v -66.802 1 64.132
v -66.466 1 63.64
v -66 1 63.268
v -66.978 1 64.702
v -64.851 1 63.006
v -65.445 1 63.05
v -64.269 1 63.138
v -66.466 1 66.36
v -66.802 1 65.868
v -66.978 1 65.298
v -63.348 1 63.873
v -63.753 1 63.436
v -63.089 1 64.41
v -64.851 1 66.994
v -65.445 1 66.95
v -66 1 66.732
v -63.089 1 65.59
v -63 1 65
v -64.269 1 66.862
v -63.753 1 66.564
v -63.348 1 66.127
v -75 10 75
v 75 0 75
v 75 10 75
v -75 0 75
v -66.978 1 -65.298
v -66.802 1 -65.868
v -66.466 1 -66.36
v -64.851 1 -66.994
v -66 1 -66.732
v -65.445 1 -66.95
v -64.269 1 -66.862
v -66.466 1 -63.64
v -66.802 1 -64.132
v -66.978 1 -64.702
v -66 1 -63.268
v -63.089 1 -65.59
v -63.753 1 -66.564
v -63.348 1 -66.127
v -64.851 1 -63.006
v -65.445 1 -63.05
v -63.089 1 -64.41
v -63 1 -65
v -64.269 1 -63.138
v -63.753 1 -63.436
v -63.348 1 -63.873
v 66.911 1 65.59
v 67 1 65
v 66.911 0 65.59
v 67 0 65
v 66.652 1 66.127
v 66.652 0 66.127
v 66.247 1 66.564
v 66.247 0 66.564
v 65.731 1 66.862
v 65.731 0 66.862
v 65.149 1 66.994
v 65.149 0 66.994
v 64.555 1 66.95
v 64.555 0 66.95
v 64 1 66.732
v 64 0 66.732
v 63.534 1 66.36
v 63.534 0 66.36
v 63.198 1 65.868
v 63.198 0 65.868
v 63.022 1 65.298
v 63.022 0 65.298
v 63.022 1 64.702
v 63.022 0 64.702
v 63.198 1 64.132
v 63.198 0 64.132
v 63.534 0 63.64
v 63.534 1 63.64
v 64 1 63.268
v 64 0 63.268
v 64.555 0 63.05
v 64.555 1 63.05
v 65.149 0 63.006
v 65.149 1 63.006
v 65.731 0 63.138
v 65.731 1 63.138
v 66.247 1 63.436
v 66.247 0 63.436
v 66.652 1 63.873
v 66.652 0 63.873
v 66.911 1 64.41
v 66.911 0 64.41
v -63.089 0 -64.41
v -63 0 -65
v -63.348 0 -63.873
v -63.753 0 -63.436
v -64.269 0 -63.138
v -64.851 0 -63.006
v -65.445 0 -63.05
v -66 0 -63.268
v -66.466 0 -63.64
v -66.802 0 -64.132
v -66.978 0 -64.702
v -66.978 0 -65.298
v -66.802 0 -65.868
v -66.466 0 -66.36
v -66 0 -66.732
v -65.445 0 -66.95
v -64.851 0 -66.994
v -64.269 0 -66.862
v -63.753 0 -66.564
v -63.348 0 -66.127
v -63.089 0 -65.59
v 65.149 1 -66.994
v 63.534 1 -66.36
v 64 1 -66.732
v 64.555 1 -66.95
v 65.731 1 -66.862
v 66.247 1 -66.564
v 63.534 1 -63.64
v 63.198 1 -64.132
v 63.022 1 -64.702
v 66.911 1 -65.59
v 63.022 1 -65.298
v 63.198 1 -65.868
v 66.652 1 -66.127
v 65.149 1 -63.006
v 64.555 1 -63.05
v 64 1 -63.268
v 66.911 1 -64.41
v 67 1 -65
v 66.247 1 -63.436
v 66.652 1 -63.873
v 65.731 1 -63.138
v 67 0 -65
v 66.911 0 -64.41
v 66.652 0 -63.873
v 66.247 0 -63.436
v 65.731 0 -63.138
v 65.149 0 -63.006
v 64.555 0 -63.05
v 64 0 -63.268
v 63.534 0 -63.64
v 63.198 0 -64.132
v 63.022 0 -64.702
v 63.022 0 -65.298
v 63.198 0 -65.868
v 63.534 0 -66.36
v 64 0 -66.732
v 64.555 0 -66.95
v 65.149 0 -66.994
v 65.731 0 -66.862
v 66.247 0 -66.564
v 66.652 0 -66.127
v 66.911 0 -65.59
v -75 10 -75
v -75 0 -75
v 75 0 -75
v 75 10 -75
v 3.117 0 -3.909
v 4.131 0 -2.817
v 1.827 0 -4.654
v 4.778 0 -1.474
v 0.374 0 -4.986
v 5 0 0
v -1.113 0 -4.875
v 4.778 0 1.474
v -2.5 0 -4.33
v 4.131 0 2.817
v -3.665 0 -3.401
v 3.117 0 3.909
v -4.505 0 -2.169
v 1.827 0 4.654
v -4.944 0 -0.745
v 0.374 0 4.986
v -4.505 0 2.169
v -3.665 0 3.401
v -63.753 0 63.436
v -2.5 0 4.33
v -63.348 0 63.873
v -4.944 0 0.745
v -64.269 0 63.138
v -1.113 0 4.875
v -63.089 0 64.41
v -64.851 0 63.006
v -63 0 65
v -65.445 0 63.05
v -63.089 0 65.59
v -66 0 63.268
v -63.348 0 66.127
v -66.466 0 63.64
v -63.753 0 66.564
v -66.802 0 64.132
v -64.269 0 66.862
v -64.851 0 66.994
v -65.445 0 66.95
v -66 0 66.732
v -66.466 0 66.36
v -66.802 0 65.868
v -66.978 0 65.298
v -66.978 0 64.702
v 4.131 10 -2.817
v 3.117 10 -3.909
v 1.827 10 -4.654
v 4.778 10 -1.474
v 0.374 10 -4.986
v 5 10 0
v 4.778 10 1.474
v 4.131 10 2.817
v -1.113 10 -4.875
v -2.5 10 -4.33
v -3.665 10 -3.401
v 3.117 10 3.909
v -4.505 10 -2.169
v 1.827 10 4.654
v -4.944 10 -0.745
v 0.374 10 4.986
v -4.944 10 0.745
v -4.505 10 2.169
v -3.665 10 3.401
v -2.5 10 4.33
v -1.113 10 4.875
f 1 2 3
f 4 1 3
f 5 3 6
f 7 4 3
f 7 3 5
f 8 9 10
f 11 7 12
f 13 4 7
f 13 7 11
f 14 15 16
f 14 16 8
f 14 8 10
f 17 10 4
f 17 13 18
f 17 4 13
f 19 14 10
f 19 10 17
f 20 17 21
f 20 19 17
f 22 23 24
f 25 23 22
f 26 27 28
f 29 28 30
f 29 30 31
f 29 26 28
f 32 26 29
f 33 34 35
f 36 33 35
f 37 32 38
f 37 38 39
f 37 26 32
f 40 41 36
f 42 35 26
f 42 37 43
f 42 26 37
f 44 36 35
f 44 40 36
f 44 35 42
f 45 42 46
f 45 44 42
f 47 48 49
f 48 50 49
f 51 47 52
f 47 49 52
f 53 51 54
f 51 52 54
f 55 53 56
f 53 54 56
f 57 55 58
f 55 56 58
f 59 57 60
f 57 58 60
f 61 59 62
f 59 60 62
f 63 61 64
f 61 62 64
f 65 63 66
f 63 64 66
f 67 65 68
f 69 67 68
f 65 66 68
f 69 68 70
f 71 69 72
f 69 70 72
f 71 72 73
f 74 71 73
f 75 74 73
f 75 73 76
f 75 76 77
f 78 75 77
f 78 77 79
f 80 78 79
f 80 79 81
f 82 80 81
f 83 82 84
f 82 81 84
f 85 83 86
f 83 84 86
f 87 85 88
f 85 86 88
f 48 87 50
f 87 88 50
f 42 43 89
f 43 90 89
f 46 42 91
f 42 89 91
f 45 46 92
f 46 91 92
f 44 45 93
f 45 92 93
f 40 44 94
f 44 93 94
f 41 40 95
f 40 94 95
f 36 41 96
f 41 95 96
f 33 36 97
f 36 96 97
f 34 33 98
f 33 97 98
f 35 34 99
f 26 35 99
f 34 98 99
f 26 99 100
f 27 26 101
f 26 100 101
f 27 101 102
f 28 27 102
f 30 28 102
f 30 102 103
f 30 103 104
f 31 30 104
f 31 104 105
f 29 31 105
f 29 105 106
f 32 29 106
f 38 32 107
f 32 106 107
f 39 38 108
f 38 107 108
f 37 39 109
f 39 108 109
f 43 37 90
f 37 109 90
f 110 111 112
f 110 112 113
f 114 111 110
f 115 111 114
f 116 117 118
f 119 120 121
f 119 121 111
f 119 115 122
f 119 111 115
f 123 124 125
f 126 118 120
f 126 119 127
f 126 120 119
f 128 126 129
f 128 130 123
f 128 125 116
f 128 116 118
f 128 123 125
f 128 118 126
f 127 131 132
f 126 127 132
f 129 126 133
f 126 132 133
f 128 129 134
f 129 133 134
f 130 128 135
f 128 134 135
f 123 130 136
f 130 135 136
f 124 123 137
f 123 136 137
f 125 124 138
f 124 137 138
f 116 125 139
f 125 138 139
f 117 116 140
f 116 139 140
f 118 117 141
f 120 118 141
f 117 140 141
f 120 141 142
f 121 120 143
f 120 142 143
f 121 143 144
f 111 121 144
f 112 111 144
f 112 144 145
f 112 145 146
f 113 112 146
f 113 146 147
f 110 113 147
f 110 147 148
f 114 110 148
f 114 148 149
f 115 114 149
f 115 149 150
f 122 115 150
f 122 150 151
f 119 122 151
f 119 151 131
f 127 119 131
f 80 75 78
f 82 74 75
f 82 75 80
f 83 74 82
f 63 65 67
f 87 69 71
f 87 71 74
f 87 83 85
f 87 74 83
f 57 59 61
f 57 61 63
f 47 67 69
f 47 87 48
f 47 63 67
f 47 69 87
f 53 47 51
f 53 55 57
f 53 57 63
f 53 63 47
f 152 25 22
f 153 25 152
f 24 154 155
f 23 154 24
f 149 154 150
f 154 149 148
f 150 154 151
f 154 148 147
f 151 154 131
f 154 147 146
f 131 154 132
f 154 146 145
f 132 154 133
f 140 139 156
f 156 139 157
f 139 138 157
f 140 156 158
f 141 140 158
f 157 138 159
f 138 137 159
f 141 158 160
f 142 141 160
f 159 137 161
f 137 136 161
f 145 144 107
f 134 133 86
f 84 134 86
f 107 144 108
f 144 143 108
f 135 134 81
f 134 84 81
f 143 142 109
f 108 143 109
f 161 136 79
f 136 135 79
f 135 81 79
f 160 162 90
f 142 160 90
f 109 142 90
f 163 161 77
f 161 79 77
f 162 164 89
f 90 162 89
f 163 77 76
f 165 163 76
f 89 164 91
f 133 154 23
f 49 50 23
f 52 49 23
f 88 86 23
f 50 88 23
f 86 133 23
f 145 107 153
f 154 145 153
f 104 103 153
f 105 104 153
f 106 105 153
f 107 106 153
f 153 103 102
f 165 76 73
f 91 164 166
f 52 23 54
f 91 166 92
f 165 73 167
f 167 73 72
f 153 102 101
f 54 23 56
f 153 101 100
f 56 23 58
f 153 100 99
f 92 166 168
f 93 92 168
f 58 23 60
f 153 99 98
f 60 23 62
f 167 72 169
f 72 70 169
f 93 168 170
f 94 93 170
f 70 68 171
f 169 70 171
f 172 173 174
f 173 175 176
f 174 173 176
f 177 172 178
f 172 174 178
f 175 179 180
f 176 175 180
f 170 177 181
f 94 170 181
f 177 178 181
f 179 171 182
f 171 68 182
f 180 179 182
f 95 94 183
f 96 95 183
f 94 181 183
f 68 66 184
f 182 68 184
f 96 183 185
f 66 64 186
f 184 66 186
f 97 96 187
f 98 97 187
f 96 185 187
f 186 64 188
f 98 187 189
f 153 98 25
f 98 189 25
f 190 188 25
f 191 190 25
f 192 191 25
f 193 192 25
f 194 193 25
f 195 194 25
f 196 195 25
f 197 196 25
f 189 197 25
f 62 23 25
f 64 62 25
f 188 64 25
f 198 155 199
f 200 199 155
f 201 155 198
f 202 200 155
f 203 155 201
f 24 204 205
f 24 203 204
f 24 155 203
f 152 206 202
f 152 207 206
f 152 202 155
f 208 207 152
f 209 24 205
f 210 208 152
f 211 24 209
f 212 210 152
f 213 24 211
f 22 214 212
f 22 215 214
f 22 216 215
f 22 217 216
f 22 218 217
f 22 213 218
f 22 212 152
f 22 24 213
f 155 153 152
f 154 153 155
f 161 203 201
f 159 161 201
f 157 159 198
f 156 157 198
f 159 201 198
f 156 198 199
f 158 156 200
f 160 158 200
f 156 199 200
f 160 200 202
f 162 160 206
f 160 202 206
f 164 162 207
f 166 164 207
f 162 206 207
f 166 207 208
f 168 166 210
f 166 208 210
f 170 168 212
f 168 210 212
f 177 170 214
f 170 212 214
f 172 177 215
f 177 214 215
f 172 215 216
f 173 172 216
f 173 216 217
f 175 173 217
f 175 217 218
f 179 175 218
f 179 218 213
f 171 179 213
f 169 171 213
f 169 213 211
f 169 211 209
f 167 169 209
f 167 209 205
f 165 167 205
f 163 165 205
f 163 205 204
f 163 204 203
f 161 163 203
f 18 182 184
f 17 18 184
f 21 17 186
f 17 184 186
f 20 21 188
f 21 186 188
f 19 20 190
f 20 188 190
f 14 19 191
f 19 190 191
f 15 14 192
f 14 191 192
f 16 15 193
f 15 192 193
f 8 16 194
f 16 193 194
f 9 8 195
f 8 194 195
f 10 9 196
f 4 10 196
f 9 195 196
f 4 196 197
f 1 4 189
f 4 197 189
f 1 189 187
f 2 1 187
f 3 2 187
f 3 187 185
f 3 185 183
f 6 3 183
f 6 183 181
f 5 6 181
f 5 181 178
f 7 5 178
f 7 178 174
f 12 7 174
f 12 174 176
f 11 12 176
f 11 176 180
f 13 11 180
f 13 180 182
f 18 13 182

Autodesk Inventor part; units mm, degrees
ref_plane "YZ Plane" through (0, 0, 0) normal (1, 0, 0) x (0, 1, 0)
ref_plane "XZ Plane" through (0, 0, 0) normal (0, 1, 0) x (-1, 0, 0)
ref_plane "XY Plane" through (0, 0, 0) normal (0, 0, 1) x (1, 0, 0)
sketch "Esquisse1" plane through (0, 0, 0) normal (0, 1, 0) x (-1, 0, 0)
  line L0 (-75, 75) -> (75, 75)
  line L1 (75, 75) -> (75, -75)
  line L2 (75, -75) -> (-75, -75)
  line L3 (-75, -75) -> (-75, 75)
  point P0 (0, 0)
  dimension "d0" = 150
  dimension "d1" = 75
  dimension "d2" = 150
  dimension "d3" = 75
extrude "Extrusion1" add sketch "Esquisse1" along normal blind 10
sketch "Esquisse2" plane through (0, 10, 0) normal (0, 1, 0) x (1, 0, 0)
  circle A0 centre (0, 0) radius 5
  dimension "d6" = 10
extrude "Extrusion2" cut sketch "Esquisse2" against normal through all
sketch "Esquisse4" plane through (0, 0, 0) normal (0, -1, 0) x (1, 0, 0)
  circle A0 centre (-65, 65) radius 2
  circle A1 centre (65, 65) radius 2
  circle A2 centre (65, -65) radius 2
  circle A3 centre (-65, -65) radius 2
  line L0 (-75, 75) -> (-75, -75) projected
  line L1 (75, -75) -> (75, 75) projected
  line L2 (75, 75) -> (-75, 75) projected
  line L3 (-75, -75) -> (75, -75) projected
  point P0 (0, 0)
  dimension "d12" = 4
  dimension "d13" = 4
  dimension "d14" = 4
  dimension "d15" = 4
  dimension "d16" = 10
  dimension "d17" = 10
  dimension "d18" = 10
  dimension "d19" = 10
  dimension "d20" = 10
  dimension "d21" = 10
  dimension "d22" = 10
  dimension "d23" = 10
extrude "Extrusion4" cut sketch "Esquisse4" against normal blind 1 contours A0 | A1 | A2 | A3
equation "\"d1\" = 0.5 * d0"
equation "\"d3\" = 0.5 * d2"
equation "\"d13\" = d12"
equation "\"d14\" = d12"
equation "\"d15\" = d12"
equation "\"d17\" = d16"
equation "\"d18\" = d16"
equation "\"d19\" = d16"
equation "\"d20\" = d16"
equation "\"d21\" = d16"
equation "\"d22\" = d16"
equation "\"d23\" = d16"
equation "\"dd0\" = 16"
equation "\"dd1\" = 28"
properties part number "Base" material "PVC, non plastifié"
